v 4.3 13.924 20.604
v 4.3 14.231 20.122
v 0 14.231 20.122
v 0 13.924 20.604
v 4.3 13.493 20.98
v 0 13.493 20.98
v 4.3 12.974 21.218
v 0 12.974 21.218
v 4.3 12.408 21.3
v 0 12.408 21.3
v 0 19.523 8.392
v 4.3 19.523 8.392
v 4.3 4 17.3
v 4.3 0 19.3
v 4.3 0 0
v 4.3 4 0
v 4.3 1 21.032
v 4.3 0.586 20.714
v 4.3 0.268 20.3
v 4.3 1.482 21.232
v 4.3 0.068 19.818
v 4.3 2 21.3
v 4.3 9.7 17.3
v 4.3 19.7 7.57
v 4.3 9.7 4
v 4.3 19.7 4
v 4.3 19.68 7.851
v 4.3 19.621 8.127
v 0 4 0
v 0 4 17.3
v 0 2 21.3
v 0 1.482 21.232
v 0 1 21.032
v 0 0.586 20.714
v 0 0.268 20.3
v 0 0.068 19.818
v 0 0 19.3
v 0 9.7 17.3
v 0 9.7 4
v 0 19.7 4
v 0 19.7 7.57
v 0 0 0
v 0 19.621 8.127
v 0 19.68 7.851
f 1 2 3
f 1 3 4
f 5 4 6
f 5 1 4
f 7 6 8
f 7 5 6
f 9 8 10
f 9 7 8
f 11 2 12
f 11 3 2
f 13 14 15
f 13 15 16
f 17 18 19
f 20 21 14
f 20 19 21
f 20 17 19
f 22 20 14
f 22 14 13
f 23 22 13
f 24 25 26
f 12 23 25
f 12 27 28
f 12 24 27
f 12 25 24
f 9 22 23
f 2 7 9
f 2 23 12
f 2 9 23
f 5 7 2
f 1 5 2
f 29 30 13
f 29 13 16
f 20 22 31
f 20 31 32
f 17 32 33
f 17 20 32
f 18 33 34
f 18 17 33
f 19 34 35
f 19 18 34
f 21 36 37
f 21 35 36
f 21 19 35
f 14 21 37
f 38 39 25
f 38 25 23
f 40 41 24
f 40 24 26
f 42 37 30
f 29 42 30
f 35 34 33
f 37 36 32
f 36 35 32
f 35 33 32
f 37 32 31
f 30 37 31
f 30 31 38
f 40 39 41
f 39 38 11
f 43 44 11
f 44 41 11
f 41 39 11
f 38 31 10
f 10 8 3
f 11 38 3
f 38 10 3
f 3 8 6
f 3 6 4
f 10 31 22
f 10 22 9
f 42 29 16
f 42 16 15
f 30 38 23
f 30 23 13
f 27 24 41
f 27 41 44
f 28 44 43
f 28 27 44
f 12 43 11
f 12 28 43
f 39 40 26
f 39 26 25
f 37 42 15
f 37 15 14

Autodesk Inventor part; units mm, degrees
ref_plane "YZ Plane" through (0, 0, 0) normal (1, 0, 0) x (0, 1, 0)
ref_plane "XZ Plane" through (0, 0, 0) normal (0, 1, 0) x (-1, 0, 0)
ref_plane "XY Plane" through (0, 0, 0) normal (0, 0, 1) x (1, 0, 0)
sketch "Sketch1" plane through (0, 0, 0) normal (1, 0, 0) x (0, 1, 0)
  line L0 (0, 0) -> (0, 21.3)
  line L1 (0, 21.3) -> (13.7, 21.3)
  line L2 (19.7, 4) -> (9.7, 4)
  line L3 (9.7, 4) -> (9.7, 17.3)
  line L4 (9.7, 17.3) -> (4, 17.3)
  line L5 (4, 17.3) -> (4, 0)
  line L6 (4, 0) -> (0, 0)
  line L7 (13.7, 21.3) -> (19.7, 8)
  line L8 (19.7, 8) -> (19.7, 4)
  dimension "d0" = 4
  dimension "d1" = 4
  dimension "d2" = 5.7
  dimension "d4" = 4
  dimension "d5" = 10
  dimension "d6" = 13.3
  dimension "d9" = 4
  dimension "d11" = 4
extrude "Extrusion1" add sketch "Sketch1" along normal blind 4.3
fillet "Fillet1" radius 2 3 edges at (2.15, 0, 21.3) (2.15, 13.7, 21.3) (2.15, 19.7, 8)
properties part number "TrayPanelJ"
